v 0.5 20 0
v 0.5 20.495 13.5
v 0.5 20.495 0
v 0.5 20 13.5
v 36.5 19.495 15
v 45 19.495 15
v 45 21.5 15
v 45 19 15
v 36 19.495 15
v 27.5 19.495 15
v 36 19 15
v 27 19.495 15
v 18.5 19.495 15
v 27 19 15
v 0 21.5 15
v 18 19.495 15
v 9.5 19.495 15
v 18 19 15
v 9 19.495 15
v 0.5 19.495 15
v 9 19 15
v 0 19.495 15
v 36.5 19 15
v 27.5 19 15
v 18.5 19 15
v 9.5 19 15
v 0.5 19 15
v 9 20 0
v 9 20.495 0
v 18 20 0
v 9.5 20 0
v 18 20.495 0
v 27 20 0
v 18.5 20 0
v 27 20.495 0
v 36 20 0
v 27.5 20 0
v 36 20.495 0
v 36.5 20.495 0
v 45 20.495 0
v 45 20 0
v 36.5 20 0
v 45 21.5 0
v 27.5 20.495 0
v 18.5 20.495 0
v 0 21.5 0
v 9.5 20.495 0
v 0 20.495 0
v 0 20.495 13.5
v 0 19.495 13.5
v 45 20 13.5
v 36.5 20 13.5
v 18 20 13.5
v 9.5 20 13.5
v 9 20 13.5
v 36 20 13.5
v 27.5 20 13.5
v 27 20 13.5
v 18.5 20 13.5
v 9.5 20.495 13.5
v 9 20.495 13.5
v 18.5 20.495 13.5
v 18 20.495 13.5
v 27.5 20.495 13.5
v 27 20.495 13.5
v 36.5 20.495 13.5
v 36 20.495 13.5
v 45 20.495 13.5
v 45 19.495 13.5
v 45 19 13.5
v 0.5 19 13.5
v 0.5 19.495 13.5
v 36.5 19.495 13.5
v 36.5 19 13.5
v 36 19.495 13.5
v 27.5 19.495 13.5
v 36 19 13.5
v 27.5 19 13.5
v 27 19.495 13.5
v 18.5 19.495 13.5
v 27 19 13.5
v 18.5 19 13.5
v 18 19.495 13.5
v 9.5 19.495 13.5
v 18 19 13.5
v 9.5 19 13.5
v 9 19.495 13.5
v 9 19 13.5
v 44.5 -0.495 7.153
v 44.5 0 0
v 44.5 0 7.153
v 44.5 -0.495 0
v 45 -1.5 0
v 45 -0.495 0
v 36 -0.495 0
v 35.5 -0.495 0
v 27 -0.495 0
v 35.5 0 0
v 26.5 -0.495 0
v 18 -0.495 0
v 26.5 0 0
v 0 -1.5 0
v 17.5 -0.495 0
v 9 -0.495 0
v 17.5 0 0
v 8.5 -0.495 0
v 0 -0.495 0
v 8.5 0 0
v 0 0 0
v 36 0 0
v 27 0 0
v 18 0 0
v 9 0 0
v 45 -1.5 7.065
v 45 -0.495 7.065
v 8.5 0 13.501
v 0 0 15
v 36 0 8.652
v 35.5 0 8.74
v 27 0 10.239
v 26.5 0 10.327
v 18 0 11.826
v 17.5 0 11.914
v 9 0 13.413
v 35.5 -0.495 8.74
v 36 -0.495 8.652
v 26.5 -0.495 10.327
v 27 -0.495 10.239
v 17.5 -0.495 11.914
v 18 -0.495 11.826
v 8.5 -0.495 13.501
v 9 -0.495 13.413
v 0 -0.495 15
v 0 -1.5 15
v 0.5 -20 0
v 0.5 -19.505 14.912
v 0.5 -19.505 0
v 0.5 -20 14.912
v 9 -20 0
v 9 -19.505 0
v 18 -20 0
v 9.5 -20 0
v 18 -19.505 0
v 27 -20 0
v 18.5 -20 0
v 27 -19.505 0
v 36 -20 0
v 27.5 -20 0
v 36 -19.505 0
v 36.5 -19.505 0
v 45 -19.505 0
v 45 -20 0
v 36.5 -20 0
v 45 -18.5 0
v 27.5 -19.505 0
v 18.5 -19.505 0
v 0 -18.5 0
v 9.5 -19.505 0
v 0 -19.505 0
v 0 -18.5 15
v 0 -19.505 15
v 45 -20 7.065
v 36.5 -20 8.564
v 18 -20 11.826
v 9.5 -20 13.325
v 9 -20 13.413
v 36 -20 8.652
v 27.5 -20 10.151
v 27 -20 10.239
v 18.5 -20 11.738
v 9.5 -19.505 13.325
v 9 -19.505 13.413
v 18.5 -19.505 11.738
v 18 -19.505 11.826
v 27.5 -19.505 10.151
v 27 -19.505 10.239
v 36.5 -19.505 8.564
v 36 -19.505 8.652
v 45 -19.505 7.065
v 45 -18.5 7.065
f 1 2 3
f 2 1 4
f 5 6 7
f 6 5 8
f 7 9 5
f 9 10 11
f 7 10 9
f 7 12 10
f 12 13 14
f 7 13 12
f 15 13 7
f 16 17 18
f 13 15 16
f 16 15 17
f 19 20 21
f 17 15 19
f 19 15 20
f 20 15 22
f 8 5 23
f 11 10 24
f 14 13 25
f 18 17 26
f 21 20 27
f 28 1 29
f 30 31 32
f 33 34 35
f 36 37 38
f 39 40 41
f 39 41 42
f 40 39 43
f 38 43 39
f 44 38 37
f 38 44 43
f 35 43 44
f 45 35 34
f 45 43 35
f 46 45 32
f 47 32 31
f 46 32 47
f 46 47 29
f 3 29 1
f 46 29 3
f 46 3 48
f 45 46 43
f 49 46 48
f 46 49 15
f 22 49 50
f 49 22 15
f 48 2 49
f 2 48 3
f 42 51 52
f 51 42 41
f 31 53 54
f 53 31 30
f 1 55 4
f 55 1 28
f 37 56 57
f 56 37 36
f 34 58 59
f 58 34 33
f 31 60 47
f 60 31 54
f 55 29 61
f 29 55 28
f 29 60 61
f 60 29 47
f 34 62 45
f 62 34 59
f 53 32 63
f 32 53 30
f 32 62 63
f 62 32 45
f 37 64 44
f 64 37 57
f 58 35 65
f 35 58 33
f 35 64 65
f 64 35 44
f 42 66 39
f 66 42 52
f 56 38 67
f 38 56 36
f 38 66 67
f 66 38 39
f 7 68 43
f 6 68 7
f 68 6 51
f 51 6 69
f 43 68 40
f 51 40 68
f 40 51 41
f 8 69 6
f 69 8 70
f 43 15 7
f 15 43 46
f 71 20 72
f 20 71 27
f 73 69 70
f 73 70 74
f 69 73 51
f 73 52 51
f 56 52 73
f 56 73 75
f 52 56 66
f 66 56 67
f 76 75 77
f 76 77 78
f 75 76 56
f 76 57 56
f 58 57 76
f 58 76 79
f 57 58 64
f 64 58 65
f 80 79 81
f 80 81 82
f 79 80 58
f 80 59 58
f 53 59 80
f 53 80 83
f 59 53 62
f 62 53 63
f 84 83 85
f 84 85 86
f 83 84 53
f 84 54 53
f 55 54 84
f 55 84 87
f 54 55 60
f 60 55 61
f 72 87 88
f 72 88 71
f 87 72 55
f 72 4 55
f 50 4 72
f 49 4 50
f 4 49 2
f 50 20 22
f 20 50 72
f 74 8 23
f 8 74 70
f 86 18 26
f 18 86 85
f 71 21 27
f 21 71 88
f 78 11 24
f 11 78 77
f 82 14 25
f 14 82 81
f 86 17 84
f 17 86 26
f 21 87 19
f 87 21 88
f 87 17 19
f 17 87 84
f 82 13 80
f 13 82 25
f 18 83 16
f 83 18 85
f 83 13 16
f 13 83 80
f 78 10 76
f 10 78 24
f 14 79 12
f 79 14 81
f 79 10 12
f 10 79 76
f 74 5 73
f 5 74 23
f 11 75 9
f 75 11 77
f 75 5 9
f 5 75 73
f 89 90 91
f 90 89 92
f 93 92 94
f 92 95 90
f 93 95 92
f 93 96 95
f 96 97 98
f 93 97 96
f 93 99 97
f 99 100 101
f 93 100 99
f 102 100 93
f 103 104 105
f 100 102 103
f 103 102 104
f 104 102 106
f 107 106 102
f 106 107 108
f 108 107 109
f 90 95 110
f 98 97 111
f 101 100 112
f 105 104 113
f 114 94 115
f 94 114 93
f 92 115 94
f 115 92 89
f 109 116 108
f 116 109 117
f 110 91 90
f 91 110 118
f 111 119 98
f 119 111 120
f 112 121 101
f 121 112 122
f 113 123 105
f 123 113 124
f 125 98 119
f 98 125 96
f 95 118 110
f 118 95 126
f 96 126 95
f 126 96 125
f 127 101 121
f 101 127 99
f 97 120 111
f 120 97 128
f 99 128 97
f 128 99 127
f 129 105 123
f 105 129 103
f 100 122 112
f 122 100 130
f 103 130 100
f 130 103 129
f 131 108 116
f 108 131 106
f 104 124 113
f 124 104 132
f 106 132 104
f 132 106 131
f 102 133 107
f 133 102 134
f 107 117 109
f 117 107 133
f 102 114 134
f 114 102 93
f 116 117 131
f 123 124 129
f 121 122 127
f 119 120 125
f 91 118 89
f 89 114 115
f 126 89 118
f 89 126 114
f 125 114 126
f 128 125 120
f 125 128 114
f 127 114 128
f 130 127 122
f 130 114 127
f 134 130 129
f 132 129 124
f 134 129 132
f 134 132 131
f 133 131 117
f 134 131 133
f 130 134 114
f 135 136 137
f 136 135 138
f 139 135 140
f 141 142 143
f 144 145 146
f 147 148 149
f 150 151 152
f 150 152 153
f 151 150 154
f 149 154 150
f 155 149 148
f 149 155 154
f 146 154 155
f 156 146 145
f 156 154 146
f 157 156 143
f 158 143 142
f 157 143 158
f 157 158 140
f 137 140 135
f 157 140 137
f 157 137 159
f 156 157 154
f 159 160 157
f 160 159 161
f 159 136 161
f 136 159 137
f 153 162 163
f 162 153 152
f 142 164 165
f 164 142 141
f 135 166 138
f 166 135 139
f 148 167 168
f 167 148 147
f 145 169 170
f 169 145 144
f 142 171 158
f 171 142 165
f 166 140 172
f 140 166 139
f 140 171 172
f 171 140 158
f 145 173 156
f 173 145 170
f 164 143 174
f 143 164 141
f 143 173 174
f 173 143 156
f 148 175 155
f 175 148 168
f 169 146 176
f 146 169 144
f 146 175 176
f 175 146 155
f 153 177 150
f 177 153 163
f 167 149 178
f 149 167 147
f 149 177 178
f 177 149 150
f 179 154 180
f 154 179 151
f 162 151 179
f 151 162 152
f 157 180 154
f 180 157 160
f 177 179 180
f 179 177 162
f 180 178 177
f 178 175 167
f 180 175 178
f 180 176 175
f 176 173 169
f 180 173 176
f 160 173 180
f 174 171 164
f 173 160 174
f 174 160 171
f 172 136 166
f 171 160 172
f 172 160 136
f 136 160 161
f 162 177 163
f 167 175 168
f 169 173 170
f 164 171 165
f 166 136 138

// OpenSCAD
// file: shapes.scad
//helper
{
    /**
 * Standard right-angled triangle
 *
 * @param number  o_len  Length of the opposite side
 * @param number  a_len  Length of the adjacent side
 * @param number  depth  How wide/deep the triangle is in the 3rd dimension
 * @param boolean center Whether to center the triangle on the origin
 * @todo a better way ?
 */
module triangle(o_len, a_len, depth, center=false)
{
    centroid = center ? [-a_len/3, -o_len/3, -depth/2] : [0, 0, 0];
    translate(centroid) linear_extrude(height=depth)
    {
        polygon(points=[[0,0],[a_len,0],[0,o_len]], paths=[[0,1,2]]);
    }
}

module trapez3d(bottom = 30, top = 25, height = 10, length = 172){
    hull(){
            trapez(bottom, top, height);
            translate([length,0,0])
            trapez(bottom, top, height);
    }
}

translate([0,0,0])
trapez3d();

module trapez(bottom = 30, top = 25, height = 10){
    off = (bottom-top);
    CubePoints = [
  [  0,  0,  0 ],  //0
  [ 0,  bottom,  0 ],  //1
  [ 0,  bottom-off,  height ],  //2
  [  0,  off,  height ]  //3
];
CubeFaces = [
  [0,1,2,3]  // bottom
  ]; // left

polyhedron( CubePoints, CubeFaces );
}

}

function step_size(total, bar_width, steps) = (total-bar_width)/steps;

module grid(grid_width=40, grid_height=60, steps_wide=2, steps_high=3, bar_width=1, bar_depth=3, name="grid"){


    step_width = step_size(grid_width, bar_width, steps_wide);
    step_height = step_size(grid_height, bar_width, steps_high);

    if(name != "grid")
        echo (name, " steps ", step_width, step_height);

    if(steps_wide>0){
    for(s_wide=[0:steps_wide]){
        translate([s_wide*step_width,0,0])
        cube([bar_width, bar_depth, grid_height]);
    }}

    if(steps_high>0){
    for(s_height=[0:steps_high]){
        translate([0,0,s_height*step_height])
        cube([grid_width, bar_depth, bar_width]);
    }}

}

function getCenter(value, center=false) = center ? value/2 : value;

//ccube is a cube thats wants to translate itself and prints the upper edge coordingates in preview mode
module ccube(x,y,z,tx=0,ty=0,tz=0, center=false, force_preview=false) {
    translate([tx,ty,tz])
    cube([x,y,z], center);

    if($preview || force_preview){
        dx = tx+getCenter(x,center);
        dy = ty+getCenter(y,center);
        dz = tz+getCenter(z,center);

        translate([dx,dy,dz])
        rotate([90,0,0])
        text(str(dx,", ",dy,", ",dz)); 
    }
}

border = 8;
wide=4;
height=2;
translate([0,70,0])
grid(100,100, wide, height, bar_width=border);

// sample cube to fit in the hole

color("#00FFFF50")
translate([border,68, border])
cube([step_size(100,border,wide)-border,6,step_size(100,border,height)-border]);

ccube(50,20,30,0,140,0, force_preview=true);
// main file
use<shapes.scad>


module platform(width=45, height=15, splits = 5, thickness=1.5, overhang = 1, bar_width=0.5){
    
    difference(){
        ccube(width, thickness, height);
        grid(width+bar_width, height,splits, 0,bar_width=bar_width, bar_depth=thickness*0.33);
    }
    if(overhang > 0){
    
        difference(){
          ccube(width, thickness+overhang, thickness,0,-overhang,height-thickness);
          translate([0,-overhang,height-thickness])
        grid(width+bar_width, height,splits, 0,bar_width=bar_width, bar_depth=thickness*0.33);
        }
        
        
    }
}

module ramp(width=45, height=15, splits = 5, thickness=1.5, overhang = 0, bar_width=0.5, left=true, degree = 10){
    difference(){
        if(left){
            platform(width, height, splits, thickness, overhang, bar_width);
            
        }
        else{
            translate([width,0,0])
            rotate([0,0,180])
            platform(width, height, splits, thickness, overhang, bar_width);
        
        }
        translate([0,-(thickness+overhang)*2,height])
        rotate([0,degree,0])
        cube([width*2,(thickness+overhang)*4,height*2]);
    }
}

translate([0,20,0])
color("grey")
platform();

color("lightgrey")
ramp(left=false);

translate([0,-20,0])
color("lightgrey")
ramp();
